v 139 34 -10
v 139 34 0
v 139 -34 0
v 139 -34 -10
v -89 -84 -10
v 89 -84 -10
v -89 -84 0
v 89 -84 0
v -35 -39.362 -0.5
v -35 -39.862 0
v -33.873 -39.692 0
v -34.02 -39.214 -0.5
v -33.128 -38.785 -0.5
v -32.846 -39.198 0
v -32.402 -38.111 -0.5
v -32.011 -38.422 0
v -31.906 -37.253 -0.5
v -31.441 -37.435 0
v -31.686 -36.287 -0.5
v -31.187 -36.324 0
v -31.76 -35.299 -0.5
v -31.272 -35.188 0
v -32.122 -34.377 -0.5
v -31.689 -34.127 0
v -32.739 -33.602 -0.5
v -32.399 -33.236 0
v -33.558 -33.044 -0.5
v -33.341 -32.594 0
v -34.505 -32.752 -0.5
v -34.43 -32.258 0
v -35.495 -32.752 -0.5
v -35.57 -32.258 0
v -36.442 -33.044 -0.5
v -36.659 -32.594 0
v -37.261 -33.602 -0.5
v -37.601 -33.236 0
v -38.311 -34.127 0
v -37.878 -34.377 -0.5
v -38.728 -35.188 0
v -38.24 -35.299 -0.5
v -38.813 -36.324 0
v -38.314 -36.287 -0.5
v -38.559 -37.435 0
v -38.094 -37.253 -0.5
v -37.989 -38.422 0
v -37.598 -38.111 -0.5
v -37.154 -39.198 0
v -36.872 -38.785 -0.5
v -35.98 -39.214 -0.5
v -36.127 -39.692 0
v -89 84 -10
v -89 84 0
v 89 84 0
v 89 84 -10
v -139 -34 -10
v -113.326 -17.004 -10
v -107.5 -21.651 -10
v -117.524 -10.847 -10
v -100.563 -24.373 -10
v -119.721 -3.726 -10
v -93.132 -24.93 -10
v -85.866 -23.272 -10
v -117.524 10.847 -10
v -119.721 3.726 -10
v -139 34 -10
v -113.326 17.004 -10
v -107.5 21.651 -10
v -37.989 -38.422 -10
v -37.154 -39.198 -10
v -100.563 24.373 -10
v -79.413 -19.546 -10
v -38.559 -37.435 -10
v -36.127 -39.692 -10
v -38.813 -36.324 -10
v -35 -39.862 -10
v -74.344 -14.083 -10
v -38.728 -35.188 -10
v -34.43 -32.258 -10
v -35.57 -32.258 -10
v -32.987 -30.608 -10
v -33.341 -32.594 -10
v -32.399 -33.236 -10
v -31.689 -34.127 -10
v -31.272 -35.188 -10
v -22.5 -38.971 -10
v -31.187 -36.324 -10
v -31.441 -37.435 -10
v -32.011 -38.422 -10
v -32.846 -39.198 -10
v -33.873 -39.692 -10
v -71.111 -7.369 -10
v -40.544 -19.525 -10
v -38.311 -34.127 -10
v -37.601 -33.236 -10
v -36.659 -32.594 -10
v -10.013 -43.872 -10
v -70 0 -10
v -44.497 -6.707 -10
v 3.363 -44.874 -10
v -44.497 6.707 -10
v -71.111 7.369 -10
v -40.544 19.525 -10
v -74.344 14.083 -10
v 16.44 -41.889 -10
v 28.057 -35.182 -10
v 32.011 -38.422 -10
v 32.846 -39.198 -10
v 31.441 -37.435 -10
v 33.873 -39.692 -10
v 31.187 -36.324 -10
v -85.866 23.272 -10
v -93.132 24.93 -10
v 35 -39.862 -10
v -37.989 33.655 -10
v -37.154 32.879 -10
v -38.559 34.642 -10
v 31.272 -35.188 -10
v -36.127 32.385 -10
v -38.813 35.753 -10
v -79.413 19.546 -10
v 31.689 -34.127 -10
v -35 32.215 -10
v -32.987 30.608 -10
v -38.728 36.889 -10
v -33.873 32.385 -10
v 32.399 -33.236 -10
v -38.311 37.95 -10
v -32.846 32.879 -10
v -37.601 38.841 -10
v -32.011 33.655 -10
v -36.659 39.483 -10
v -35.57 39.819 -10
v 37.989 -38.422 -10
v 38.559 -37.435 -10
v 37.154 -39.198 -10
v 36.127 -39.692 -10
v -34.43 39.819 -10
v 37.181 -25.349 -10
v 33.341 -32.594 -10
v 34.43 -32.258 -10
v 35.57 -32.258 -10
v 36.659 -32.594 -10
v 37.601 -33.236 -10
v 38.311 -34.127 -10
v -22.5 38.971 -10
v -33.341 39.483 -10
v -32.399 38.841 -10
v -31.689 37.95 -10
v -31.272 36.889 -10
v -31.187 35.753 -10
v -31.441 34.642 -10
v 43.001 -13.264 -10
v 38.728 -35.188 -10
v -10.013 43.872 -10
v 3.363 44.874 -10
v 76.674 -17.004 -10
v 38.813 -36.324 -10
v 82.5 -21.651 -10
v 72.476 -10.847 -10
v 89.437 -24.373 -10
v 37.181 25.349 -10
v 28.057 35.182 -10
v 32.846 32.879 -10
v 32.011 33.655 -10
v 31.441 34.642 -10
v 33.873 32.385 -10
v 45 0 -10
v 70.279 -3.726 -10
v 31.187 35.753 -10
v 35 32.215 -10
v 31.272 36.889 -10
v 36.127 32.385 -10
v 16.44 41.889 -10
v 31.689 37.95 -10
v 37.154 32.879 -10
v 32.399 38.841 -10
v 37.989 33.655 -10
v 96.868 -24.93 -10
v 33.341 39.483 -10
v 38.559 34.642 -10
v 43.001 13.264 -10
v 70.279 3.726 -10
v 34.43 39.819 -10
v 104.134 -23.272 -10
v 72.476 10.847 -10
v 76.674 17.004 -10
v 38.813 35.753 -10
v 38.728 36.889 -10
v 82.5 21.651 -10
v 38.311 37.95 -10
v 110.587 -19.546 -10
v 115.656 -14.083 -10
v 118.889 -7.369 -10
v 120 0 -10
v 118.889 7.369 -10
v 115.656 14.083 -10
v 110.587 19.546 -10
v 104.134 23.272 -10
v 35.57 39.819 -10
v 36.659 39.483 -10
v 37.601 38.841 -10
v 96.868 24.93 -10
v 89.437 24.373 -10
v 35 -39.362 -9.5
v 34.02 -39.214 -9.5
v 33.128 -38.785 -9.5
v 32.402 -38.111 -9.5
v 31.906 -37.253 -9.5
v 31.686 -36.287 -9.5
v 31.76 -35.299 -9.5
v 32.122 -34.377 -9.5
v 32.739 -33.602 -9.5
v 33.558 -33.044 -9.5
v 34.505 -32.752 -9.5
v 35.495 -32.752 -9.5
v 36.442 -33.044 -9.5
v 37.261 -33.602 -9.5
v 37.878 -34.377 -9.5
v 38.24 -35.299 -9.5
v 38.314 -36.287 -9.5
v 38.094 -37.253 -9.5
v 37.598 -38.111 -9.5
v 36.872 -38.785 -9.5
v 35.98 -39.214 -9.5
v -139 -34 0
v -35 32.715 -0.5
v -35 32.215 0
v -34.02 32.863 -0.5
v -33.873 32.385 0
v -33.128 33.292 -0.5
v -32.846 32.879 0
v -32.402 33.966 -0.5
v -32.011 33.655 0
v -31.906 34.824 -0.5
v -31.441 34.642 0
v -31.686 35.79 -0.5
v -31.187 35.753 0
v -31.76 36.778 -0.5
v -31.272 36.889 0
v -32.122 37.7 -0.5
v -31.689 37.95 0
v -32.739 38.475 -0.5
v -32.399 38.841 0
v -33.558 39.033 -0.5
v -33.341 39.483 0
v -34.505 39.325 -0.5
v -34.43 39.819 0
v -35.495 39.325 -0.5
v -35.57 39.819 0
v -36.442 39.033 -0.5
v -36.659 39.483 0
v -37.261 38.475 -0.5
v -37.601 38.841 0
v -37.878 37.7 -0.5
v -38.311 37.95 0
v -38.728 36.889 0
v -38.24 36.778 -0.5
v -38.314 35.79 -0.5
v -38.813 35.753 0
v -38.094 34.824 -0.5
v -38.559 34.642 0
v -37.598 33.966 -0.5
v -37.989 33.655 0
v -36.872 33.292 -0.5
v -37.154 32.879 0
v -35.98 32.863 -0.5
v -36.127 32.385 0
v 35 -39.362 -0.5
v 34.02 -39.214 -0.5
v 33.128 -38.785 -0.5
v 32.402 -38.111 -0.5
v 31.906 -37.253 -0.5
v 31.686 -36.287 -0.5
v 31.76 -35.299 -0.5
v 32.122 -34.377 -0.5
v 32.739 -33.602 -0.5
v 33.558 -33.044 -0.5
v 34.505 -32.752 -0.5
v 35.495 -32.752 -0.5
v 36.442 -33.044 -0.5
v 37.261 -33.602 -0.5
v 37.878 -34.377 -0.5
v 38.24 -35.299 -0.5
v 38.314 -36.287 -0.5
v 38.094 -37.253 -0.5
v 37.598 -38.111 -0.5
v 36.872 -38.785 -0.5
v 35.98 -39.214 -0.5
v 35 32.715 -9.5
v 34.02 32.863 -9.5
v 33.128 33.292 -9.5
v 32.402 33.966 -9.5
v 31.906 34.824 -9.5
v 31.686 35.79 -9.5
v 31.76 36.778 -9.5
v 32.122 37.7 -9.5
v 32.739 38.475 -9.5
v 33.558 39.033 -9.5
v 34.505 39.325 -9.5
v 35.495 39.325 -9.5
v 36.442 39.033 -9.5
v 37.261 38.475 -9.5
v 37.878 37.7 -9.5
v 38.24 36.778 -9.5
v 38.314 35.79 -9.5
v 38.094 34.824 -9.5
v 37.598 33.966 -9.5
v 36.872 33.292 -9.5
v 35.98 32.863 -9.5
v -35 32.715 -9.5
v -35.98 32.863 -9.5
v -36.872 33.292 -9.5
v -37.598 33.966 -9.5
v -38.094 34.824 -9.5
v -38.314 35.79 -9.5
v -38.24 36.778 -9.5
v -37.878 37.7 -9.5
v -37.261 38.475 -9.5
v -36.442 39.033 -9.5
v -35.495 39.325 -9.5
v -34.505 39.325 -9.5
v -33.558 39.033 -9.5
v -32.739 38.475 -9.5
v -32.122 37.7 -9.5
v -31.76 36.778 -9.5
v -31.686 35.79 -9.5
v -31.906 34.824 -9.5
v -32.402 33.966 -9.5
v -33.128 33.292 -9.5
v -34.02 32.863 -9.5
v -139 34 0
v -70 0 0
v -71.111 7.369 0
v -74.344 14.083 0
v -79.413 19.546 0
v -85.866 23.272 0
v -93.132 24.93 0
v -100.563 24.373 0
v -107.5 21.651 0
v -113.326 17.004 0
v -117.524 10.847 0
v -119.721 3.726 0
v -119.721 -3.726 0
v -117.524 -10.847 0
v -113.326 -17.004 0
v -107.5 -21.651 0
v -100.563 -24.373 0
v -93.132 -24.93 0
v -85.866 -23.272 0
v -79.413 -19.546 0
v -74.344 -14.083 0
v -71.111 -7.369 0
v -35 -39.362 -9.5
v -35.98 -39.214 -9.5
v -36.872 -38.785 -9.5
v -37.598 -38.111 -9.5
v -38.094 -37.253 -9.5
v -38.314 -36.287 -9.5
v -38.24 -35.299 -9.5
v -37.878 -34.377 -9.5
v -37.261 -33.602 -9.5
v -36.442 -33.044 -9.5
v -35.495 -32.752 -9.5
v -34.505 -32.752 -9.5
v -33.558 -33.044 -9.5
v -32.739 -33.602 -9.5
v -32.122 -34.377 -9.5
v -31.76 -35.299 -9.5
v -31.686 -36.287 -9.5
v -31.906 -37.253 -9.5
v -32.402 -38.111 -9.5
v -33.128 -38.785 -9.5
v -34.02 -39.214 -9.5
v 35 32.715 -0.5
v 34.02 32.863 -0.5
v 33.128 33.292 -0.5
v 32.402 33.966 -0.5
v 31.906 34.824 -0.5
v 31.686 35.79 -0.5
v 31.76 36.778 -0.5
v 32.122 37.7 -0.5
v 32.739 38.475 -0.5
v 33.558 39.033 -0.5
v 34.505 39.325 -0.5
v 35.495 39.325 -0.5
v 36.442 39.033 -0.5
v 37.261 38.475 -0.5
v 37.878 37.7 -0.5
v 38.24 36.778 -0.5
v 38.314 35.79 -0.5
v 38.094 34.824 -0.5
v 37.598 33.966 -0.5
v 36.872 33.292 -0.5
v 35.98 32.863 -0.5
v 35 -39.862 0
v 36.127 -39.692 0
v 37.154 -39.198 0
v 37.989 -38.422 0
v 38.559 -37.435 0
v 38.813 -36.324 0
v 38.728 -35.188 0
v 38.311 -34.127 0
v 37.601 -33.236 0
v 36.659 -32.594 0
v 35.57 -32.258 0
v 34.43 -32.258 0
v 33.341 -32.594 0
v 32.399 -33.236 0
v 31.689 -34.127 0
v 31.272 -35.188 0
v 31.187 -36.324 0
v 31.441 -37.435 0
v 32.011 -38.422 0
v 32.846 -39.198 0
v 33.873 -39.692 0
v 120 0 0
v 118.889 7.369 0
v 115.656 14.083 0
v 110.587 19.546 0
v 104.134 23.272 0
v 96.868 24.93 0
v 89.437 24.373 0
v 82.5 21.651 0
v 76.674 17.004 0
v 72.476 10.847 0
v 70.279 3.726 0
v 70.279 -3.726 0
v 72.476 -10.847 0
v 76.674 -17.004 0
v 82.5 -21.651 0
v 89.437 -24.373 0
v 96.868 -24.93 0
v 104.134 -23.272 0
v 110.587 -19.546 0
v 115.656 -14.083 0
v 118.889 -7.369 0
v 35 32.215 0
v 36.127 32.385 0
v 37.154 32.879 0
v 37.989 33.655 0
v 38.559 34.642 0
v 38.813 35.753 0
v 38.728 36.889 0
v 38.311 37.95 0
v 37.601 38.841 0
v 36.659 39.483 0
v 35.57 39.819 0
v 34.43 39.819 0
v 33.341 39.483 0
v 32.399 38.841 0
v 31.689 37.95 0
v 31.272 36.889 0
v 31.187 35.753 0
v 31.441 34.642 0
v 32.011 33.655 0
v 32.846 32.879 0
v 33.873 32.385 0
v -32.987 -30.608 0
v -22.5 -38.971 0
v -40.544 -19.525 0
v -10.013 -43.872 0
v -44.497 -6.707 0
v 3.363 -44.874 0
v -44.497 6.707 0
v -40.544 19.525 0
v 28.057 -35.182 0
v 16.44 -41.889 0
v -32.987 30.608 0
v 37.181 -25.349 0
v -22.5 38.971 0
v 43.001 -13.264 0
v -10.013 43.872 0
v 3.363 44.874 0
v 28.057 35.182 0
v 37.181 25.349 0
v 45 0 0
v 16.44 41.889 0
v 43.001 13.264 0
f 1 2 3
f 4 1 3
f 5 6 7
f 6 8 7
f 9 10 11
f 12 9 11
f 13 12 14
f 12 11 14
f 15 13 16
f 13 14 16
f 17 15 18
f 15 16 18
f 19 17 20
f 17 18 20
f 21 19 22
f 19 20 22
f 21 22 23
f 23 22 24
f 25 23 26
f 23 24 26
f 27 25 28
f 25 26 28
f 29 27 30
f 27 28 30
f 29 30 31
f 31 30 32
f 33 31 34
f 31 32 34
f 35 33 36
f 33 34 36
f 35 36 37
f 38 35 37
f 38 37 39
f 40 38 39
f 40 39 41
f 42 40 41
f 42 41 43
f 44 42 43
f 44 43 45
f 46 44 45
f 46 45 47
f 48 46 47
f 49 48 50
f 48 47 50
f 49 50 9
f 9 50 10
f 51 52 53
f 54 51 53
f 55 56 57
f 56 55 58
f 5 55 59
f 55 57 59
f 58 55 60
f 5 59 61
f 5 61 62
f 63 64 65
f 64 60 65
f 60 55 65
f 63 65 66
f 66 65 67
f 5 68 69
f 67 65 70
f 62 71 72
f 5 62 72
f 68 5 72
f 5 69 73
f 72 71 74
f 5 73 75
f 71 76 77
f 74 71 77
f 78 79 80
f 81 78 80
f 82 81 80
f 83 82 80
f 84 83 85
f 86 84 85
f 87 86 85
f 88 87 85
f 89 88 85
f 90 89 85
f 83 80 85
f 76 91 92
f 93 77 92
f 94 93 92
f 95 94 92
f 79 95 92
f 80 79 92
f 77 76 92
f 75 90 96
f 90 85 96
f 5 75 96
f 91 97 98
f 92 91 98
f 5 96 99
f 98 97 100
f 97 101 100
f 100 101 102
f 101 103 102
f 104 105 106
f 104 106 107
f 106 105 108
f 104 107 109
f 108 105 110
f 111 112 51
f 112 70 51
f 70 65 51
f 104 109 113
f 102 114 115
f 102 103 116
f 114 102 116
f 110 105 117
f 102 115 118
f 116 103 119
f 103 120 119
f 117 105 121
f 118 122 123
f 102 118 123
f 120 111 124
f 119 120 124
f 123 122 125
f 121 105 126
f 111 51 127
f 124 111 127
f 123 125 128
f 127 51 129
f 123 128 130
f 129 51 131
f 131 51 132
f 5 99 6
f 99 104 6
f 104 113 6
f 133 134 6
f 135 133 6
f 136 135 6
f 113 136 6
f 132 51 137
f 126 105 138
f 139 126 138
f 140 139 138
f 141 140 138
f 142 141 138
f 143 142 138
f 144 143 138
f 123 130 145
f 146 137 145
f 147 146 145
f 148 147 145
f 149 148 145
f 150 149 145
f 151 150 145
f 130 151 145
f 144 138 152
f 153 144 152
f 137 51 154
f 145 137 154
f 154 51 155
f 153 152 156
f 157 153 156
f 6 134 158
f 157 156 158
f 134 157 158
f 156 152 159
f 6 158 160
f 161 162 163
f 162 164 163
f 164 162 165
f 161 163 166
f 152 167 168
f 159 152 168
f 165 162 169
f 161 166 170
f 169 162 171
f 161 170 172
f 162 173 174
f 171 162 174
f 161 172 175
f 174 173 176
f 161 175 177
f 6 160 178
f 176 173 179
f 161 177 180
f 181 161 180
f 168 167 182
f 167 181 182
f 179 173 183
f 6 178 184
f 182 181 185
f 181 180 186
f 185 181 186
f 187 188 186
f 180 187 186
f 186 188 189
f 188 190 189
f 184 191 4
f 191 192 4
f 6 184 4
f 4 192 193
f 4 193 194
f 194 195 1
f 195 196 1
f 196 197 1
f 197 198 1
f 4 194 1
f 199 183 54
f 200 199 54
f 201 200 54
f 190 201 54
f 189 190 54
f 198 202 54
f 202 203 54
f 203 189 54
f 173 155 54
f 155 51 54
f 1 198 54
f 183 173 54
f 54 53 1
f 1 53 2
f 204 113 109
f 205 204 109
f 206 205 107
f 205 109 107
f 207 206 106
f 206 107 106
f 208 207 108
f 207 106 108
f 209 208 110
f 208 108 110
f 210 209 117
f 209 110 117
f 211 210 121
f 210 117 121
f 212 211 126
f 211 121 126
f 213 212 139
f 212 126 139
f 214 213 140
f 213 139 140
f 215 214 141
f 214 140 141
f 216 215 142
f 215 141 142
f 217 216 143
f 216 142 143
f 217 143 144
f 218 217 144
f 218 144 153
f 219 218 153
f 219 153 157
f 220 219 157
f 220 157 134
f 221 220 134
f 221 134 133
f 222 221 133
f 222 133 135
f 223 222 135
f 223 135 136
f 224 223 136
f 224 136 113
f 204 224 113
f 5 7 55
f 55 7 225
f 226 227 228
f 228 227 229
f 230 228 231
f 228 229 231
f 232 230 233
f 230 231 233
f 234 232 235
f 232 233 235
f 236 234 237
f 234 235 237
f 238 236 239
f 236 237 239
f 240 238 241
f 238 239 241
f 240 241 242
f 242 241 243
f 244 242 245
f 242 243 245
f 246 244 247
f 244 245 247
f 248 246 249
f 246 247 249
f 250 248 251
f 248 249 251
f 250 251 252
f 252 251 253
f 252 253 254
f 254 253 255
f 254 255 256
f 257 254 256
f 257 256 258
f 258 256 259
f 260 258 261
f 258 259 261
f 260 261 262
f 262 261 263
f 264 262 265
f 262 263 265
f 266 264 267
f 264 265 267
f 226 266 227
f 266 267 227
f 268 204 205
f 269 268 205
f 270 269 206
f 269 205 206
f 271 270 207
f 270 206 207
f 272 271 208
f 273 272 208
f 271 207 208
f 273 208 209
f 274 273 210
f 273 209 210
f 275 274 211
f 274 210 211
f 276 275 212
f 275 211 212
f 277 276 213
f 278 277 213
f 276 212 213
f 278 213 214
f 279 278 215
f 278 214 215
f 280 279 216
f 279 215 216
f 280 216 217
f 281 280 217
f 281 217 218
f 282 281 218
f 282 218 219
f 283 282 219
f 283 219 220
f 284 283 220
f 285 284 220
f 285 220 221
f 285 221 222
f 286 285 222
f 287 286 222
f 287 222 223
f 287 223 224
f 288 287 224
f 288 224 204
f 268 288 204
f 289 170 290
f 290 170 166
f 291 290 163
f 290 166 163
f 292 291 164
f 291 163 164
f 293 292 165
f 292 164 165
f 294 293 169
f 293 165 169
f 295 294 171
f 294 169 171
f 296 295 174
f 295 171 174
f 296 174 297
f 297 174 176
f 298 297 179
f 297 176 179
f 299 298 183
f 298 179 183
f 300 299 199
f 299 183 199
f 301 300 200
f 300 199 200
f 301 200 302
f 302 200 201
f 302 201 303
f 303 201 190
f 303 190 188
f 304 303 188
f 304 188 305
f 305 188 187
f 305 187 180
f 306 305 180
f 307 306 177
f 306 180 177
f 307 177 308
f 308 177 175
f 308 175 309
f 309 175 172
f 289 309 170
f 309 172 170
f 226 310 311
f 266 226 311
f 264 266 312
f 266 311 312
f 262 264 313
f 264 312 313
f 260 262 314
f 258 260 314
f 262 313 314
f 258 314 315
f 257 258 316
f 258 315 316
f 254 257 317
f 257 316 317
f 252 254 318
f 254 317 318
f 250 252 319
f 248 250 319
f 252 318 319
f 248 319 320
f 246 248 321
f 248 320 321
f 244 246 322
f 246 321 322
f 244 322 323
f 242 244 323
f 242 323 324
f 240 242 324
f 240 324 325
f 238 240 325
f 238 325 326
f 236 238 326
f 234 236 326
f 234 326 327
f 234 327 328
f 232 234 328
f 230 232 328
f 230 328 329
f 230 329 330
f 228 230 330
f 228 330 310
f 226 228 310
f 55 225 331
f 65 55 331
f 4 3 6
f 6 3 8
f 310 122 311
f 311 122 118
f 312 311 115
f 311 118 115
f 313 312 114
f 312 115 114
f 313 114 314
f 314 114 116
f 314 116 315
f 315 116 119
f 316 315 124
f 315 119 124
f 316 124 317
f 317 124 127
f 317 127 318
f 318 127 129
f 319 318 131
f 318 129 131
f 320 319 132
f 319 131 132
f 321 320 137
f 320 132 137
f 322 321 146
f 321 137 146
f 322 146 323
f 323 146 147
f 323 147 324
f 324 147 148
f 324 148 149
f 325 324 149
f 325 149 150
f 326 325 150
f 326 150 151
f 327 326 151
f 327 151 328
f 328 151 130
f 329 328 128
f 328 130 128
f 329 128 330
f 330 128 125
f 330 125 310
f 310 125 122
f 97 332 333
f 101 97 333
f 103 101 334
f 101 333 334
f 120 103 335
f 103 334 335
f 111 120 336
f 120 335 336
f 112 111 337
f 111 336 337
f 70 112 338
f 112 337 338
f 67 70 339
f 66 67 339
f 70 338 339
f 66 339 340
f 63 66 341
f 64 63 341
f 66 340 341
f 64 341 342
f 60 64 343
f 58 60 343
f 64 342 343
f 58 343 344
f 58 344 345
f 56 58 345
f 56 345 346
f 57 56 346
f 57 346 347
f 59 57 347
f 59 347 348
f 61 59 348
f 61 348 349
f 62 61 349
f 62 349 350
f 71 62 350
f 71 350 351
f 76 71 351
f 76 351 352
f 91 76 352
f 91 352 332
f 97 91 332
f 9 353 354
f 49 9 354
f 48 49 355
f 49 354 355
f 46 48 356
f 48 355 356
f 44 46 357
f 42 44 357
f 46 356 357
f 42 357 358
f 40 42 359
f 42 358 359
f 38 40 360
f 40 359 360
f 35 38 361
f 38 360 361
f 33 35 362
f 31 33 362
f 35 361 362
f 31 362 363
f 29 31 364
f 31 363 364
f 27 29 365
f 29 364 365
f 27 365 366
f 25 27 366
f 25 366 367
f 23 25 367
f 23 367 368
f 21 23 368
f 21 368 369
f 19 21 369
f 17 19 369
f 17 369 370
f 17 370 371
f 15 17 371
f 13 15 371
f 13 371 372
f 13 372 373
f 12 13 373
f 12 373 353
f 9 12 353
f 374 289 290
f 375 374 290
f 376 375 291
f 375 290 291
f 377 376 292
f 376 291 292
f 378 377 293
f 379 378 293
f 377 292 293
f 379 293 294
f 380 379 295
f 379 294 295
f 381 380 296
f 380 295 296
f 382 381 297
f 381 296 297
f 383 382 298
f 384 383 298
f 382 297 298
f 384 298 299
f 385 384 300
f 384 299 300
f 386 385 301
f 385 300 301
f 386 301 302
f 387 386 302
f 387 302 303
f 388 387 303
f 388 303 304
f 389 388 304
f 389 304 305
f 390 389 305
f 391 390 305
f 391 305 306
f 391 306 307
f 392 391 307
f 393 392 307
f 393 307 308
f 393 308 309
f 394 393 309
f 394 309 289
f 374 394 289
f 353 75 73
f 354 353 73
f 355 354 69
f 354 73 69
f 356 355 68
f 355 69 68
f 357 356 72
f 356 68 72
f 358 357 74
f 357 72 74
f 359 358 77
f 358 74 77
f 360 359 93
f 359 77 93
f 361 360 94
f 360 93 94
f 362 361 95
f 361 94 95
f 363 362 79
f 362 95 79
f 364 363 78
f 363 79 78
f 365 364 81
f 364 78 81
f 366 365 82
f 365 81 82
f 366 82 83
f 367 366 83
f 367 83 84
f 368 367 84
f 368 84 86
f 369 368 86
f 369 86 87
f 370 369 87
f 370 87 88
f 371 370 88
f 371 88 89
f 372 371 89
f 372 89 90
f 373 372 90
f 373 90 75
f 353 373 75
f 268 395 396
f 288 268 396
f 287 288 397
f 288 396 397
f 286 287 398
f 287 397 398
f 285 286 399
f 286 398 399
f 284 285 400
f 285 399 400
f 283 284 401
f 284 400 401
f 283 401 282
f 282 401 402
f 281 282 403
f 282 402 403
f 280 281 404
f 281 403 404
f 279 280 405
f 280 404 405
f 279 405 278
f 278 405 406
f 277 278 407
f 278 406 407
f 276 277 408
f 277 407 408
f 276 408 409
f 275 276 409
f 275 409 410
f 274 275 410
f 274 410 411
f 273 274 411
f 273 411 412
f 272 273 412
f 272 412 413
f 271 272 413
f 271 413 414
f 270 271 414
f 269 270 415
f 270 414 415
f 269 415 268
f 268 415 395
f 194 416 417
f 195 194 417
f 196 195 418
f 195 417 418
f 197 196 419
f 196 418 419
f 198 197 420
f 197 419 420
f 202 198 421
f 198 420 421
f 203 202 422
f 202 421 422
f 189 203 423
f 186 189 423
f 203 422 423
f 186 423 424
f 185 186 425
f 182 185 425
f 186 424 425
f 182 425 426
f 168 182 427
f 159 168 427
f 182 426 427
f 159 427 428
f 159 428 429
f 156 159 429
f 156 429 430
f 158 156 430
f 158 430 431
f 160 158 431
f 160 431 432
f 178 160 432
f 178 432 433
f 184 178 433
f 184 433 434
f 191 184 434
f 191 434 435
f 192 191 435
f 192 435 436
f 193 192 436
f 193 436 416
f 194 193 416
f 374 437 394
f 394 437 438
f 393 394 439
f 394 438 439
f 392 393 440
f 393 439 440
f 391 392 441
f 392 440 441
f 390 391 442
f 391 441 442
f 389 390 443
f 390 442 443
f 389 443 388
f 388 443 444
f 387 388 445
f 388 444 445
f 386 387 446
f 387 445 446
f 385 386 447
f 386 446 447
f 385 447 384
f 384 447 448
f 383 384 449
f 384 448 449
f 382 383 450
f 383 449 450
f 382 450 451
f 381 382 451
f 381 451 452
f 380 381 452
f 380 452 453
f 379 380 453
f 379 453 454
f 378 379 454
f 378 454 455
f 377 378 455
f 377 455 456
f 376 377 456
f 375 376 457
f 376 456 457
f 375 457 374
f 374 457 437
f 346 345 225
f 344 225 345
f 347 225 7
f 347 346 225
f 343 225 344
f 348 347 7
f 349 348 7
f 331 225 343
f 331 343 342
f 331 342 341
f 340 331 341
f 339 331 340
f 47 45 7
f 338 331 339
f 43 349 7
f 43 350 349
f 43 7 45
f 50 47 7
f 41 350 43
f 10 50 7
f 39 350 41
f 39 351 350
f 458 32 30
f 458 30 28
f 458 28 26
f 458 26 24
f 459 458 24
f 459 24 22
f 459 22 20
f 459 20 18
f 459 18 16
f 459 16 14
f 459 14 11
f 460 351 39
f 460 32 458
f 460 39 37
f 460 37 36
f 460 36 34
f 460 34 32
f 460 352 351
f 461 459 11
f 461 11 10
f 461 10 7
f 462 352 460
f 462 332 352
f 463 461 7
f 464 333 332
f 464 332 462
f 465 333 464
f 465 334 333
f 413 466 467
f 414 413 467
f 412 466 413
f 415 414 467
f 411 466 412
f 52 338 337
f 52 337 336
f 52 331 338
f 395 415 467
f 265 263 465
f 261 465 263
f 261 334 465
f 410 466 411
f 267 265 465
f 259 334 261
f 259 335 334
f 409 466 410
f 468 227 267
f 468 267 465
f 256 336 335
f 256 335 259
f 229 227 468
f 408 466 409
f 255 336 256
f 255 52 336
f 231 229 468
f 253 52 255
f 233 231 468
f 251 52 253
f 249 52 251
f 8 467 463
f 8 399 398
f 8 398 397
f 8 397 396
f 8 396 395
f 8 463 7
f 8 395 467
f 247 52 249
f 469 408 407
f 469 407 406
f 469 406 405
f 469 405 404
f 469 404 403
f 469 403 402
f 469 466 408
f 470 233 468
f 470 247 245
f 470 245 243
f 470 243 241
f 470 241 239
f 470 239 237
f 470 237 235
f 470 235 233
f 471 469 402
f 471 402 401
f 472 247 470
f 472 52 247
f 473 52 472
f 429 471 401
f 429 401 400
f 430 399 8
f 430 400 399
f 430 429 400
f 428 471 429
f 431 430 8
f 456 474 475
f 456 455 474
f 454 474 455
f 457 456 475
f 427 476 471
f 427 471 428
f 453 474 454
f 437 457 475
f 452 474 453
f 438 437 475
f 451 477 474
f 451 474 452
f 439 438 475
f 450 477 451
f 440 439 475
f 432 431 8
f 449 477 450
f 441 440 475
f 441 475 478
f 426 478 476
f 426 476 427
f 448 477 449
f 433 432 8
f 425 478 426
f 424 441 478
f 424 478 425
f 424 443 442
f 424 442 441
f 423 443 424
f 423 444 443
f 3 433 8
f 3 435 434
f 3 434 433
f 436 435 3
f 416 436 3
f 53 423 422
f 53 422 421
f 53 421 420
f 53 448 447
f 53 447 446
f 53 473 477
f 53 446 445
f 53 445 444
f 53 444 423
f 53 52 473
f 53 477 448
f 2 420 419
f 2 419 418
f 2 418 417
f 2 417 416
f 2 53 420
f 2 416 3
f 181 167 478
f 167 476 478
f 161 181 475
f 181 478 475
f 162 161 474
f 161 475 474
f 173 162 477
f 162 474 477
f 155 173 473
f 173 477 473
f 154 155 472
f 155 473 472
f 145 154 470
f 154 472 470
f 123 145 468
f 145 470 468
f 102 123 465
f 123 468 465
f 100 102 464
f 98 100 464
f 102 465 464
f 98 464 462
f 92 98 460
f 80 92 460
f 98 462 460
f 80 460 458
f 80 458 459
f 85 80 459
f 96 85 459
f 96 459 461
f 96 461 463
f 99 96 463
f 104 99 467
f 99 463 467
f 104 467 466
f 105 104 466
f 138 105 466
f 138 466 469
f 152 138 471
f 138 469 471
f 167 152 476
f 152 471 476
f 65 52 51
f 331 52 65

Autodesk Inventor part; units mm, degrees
ref_plane "YZ Plane" through (0, 0, 0) normal (1, 0, 0) x (0, 1, 0)
ref_plane "XZ Plane" through (0, 0, 0) normal (0, 1, 0) x (-1, 0, 0)
ref_plane "XY Plane" through (0, 0, 0) normal (0, 0, 1) x (1, 0, 0)
sketch "Sketch1" plane through (0, 0, 0) normal (0, 0, 1) x (1, 0, 0)
  line L0 (0, 117.6) -> (0, -117.6) projected
  line L1 (-194.6, 0) -> (194.6, 0) projected
  line L2 (-89, 84) -> (89, 84)
  line L3 (139, 34) -> (139, -34)
  line L4 (89, -84) -> (-89, -84)
  line L5 (-139, -34) -> (-139, 34)
  circle A0 centre (-95, 0) radius 25
  circle A1 centre (95, 0) radius 25
  circle A2 centre (0, 0) radius 45
  line L6 (-89, 84) -> (-139, 34)
  line L7 (89, 84) -> (139, 34)
  line L8 (139, -34) -> (89, -84)
  line L9 (-89, -84) -> (-139, -34)
  point P0 (-139, 84)
  point P1 (139, 84)
  point P2 (-139, -84)
  point P3 (139, -84)
  dimension "d0" = 278
  dimension "d1" = 168
  dimension "d8" = 50
  dimension "d9" = 190
  dimension "d10" = 95
  dimension "d11" = 90
  dimension "d12" = 50
  dimension "d13" = 50
  dimension "d14" = 50
  dimension "d15" = 50
  dimension "d16" = 50
  dimension "d17" = 50
  dimension "d18" = 50
  dimension "d19" = 50
extrude "Extrusion2" add sketch "Sketch1" against normal blind 10 contours L2 L7 L3 L1 A1 A2 L0 | L0 A2 L1 A0 L5 L6 L2 | L1 A1 L3 L8 L4 L0 A2 | A2 L0 L4 L9 L5 L1 A0
sketch "Sketch2" plane through (0, 0, 0) normal (0, 0, 1) x (1, 0, 0)
  line L0 (-139, -34) -> (-89, -84) projected
  line L1 (-89, -84) -> (89, -84) projected
  line L2 (89, -84) -> (139, -34) projected
  line L3 (139, -34) -> (139, 34) projected
  line L4 (139, 34) -> (89, 84) projected
  line L5 (89, 84) -> (-89, 84) projected
  line L6 (-89, 84) -> (-139, 34) projected
  line L7 (-139, 34) -> (-139, -34) projected
  circle A0 centre (-95, 0) radius 25 projected
  circle A1 centre (0, 0) radius 45 projected
  circle A2 centre (95, 0) radius 25 projected
  line L8 (-35, 36.0385) -> (35, 36.0385)
  line L9 (35, 36.0385) -> (35, -36.0385)
  line L10 (35, -36.0385) -> (-35, -36.0385)
  line L11 (-35, -36.0385) -> (-35, 36.0385)
  line L12 (0, 117.6) -> (0, -117.6) projected
  line L13 (-194.6, 0) -> (194.6, 0) projected
  dimension "d22" = 70
hole "Hole1" at (-35, 36.0385, 0) at (35, 36.0385, 0) at (-35, -36.0385, 0) at (35, -36.0385, 0) direction (0, 0, -1) diameter 6.647 end through all thread size "M8x1.25" class "6H" standard "ISO Metric profile"
chamfer "Chamfer2" distance 0.5 angle 45 8 edges at (-35, -32.715, -10) (35, -32.715, -10) (-35, 39.362, -10) (35, 39.362, -10) (-35, -32.715, 0) (35, -32.715, 0) (-35, 39.362, 0) (35, 39.362, 0)
equation "\"d13\" = d12"
equation "\"d14\" = d12"
equation "\"d15\" = d14"
equation "\"d16\" = d12"
equation "\"d17\" = d16"
equation "\"d18\" = d12"
equation "\"d19\" = d18"
properties part number "SlipersLåda 211018004-1"
